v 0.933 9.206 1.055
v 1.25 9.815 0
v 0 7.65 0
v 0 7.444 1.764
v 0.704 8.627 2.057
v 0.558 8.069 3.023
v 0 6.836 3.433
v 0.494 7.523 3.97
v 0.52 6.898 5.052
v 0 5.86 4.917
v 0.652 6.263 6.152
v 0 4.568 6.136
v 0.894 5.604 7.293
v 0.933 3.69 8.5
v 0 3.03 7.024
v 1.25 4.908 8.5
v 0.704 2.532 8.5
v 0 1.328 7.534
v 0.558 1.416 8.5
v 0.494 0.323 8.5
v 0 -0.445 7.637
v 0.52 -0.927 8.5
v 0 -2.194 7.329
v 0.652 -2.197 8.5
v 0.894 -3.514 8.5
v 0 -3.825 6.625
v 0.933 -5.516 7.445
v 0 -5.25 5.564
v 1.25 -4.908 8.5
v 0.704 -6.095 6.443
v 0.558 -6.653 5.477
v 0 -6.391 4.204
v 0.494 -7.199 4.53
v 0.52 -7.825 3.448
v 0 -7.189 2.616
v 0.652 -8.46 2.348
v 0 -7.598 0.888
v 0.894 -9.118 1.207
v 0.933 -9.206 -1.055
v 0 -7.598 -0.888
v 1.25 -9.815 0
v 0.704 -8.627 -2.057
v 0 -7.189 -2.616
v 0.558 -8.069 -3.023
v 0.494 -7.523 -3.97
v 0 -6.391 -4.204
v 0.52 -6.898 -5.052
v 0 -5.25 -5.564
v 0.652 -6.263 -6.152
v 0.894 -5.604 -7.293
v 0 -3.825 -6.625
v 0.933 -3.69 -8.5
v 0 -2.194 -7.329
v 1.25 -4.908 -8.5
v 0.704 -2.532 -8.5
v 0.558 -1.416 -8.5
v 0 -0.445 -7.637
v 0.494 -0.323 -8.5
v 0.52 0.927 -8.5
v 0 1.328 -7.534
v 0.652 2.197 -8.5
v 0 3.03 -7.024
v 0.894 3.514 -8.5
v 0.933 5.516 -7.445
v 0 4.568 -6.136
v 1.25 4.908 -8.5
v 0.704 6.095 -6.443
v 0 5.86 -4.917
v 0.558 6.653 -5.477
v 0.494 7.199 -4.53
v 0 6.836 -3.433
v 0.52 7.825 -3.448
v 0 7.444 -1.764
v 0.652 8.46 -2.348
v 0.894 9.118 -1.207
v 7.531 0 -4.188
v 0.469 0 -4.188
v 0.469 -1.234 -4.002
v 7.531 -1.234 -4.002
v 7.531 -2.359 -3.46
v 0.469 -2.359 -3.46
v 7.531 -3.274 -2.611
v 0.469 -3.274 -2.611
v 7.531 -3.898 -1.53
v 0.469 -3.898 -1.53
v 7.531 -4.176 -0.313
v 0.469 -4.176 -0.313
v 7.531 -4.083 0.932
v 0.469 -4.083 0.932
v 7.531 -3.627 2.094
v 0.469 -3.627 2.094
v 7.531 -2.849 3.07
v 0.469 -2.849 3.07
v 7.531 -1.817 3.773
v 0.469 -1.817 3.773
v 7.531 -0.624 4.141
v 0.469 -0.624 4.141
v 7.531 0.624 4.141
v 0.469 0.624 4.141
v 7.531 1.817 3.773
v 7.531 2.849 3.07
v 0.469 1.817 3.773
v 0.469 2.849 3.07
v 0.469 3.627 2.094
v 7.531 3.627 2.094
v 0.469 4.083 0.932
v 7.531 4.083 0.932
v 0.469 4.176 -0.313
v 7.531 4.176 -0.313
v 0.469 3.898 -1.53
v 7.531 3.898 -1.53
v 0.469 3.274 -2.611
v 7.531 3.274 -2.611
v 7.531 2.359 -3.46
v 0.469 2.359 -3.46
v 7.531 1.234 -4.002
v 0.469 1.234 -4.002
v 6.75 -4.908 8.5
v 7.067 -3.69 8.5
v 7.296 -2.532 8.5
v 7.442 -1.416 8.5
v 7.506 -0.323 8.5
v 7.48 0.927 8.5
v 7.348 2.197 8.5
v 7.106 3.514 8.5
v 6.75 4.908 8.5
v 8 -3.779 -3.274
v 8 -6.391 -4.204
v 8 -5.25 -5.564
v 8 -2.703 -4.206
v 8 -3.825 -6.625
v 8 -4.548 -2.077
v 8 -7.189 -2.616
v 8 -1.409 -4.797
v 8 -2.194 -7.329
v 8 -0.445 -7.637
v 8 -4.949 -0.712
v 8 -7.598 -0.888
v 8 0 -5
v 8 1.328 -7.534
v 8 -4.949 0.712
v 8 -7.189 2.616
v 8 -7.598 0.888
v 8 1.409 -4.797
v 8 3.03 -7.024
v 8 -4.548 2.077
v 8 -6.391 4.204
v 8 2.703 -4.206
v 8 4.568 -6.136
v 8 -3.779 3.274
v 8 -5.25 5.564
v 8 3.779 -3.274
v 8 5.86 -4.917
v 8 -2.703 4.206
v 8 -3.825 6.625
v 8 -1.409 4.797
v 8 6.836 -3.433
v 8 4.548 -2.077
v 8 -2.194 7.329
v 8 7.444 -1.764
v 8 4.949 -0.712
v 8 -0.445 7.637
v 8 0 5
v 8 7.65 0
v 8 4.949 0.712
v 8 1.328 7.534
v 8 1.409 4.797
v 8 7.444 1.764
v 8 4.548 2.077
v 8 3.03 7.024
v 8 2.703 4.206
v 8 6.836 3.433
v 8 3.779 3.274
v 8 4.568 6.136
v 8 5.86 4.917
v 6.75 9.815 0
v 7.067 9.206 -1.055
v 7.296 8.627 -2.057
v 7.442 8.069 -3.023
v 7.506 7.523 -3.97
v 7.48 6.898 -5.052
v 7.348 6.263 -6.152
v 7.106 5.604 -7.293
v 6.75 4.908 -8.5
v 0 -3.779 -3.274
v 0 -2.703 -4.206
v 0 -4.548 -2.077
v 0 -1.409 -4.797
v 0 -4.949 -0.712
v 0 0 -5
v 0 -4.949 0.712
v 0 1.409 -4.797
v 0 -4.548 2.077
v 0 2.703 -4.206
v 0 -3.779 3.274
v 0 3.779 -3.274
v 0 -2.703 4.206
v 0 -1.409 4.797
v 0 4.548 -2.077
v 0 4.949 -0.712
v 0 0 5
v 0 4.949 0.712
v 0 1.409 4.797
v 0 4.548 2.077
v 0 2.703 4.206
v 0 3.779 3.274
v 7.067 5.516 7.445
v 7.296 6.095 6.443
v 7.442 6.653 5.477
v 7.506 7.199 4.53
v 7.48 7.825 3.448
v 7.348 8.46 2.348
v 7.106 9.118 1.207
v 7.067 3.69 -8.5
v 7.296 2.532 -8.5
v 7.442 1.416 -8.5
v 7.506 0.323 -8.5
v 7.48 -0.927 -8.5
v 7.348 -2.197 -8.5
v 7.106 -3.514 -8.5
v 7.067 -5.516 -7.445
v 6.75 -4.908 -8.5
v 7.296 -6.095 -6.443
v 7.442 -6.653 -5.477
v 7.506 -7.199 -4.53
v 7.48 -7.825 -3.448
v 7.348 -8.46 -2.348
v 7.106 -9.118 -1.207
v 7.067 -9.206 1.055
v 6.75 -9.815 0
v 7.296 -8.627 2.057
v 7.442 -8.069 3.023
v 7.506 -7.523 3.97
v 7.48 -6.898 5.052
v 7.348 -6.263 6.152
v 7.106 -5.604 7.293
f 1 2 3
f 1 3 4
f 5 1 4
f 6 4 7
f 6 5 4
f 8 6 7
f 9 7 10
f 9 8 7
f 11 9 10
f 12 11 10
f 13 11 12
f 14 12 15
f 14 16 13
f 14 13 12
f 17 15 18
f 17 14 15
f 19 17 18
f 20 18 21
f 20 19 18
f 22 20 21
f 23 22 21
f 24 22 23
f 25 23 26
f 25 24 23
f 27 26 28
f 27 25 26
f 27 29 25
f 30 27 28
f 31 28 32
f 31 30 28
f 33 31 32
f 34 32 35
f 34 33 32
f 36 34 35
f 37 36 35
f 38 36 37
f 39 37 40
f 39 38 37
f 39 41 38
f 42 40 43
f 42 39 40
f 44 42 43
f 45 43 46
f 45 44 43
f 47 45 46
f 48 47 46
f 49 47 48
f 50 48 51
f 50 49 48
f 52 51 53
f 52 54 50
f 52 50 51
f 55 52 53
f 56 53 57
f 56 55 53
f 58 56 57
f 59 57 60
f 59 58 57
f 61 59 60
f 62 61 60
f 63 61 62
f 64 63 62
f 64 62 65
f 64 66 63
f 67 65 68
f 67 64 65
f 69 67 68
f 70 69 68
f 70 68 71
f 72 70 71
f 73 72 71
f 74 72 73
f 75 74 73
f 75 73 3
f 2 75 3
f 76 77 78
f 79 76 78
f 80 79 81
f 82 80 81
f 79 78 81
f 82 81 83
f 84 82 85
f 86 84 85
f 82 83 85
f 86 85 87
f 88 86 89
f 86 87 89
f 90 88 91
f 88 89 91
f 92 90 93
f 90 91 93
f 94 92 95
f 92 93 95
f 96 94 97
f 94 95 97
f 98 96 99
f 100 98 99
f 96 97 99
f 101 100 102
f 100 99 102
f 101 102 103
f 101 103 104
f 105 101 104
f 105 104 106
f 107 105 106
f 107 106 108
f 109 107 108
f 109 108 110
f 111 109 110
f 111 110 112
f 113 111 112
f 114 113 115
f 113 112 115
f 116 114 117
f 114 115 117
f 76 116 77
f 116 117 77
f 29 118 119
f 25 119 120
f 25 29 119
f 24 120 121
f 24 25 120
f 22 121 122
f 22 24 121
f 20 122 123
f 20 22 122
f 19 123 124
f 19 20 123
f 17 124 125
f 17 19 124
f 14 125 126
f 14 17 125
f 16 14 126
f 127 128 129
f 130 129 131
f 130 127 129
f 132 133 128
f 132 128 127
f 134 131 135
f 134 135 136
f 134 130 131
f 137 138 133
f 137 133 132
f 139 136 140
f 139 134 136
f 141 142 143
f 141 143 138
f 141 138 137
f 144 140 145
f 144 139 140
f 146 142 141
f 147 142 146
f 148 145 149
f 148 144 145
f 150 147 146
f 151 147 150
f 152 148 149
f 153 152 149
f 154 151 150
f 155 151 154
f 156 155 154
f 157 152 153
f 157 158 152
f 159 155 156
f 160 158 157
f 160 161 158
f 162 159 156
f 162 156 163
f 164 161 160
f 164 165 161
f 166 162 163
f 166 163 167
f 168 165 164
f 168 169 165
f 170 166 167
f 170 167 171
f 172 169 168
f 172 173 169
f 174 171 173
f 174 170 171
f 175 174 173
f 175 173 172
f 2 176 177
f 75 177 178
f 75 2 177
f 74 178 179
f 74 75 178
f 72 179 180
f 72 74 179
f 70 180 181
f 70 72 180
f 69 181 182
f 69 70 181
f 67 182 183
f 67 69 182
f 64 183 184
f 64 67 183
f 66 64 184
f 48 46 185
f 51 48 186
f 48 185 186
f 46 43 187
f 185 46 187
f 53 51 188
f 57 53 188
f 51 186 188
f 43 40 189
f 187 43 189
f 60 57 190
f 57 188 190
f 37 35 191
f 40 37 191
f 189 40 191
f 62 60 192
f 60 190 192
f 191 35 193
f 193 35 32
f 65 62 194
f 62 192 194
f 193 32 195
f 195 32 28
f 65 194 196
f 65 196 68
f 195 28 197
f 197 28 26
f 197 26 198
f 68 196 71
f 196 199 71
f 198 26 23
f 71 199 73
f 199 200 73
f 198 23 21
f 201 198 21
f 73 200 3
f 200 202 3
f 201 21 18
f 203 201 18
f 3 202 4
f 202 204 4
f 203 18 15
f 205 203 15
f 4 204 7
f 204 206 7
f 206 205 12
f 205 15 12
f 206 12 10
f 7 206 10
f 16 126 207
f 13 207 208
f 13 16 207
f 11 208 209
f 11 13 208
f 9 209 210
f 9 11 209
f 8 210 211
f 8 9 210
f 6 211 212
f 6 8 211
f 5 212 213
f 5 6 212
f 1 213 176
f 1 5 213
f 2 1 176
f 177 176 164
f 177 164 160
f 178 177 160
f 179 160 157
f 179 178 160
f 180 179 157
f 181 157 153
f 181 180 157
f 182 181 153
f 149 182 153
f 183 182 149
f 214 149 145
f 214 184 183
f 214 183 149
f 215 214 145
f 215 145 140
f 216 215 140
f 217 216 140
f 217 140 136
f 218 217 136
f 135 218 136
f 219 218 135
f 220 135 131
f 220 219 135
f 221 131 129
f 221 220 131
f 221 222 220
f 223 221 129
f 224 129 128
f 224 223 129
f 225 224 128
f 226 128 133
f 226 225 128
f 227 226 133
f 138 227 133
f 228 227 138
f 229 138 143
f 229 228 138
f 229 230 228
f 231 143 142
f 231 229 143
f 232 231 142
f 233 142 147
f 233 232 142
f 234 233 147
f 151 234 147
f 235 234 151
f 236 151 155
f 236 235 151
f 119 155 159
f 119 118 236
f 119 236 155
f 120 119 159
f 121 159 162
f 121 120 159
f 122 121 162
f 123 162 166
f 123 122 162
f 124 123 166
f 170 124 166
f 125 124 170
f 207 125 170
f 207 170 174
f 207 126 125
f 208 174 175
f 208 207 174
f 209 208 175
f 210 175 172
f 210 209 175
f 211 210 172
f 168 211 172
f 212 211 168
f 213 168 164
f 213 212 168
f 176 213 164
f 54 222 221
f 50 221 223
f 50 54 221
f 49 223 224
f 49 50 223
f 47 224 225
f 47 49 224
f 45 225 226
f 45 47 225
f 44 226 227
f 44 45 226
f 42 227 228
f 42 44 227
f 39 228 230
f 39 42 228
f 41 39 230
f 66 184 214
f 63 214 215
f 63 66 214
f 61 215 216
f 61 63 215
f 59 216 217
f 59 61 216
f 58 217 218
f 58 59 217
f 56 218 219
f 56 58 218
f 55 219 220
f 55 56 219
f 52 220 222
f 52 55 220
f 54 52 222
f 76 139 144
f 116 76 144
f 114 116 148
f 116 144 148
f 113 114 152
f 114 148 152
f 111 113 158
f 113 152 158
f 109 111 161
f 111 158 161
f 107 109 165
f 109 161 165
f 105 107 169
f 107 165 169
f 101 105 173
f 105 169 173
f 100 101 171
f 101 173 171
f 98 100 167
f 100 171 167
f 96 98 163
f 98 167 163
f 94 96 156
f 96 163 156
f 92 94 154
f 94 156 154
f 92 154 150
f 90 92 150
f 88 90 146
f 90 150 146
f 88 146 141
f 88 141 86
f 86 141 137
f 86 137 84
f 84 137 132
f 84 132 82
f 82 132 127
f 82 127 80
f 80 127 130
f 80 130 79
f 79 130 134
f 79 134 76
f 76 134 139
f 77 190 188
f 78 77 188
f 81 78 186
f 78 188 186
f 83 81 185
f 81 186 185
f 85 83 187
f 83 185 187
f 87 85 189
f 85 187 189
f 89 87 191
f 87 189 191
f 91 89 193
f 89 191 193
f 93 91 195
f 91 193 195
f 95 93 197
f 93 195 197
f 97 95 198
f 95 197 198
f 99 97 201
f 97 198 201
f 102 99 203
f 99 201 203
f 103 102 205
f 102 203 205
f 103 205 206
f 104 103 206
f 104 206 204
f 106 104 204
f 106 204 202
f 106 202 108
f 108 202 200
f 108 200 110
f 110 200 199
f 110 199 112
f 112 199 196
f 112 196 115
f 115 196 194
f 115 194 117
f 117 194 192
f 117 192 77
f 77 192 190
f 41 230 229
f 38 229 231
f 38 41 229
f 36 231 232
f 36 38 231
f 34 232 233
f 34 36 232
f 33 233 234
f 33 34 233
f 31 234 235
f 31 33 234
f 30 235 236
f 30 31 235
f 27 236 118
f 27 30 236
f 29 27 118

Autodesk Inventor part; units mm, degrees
ref_plane "YZ Plane" through (0, 0, 0) normal (1, 0, 0) x (0, 1, 0)
ref_plane "XZ Plane" through (0, 0, 0) normal (0, 1, 0) x (-1, 0, 0)
sketch "Эскиз1" plane through (0, 0, 0) normal (1, 0, 0) x (0, 1, 0)
  line L0 (-9.815, 0) -> (-4.9075, 8.5)
  line L1 (-4.9075, 8.5) -> (4.9075, 8.5)
  line L2 (4.9075, 8.5) -> (9.815, 0)
  line L3 (9.815, 0) -> (4.9075, -8.5)
  line L4 (4.9075, -8.5) -> (-4.9075, -8.5)
  line L5 (-4.9075, -8.5) -> (-9.815, 0)
  point P0 (0, 0)
  point P1 (0, 0)
  dimension "d0" = 19.6299
extrude "Базовый элемент" add sketch "Эскиз1" along normal blind 8
sketch "Эскиз2" plane through (0, 0, 0) normal (0, 0, 1) x (1, 0, 0)
  line L0 (0, 4.9075) -> (0, 9.815) projected
  line L1 (0, 9.815) -> (8, 9.815) projected
  line L2 (8, 4.9075) -> (8, 9.815) projected
  line L3 (-1.6, 0) -> (9.6, 0) projected
  line L4 (1.2499, 9.815) -> (0, 7.65)
  line L5 (6.7501, 9.815) -> (8, 7.65)
  dimension "d3" = 30
  dimension "d4" = 30
  dimension "d5" = 15.3
  dimension "d6" = 15.3
revolve "Фаска1" cut sketch "Эскиз2" angle 360 about axis through (-10, 0, 0) along (1, 0, 0)
sketch "Эскиз3" plane through (8, 0, 0) normal (1, 0, 0) x (0, 0, -1)
  arc A0 (-0.625, -1.0825) -> (0.625, -1.0825) centre (0, 0) ccw projected
hole "Резьба" at (8, 0, 0) direction (-1, 0, 0) diameter 8.376 end through all thread size "M10x1.5" class "6H" standard "ISO Metric profile"
chamfer "Фаска2" distance 0.8119 angle 30 1 edges at (8, 0, 4.188) measured on face at (8, 6.4117, -0.7785)
chamfer "Фаска3" distance 0.8119 angle 30 1 edges at (0, 0, 4.188) measured on face at (0, 6.4117, -0.7785)
ref_plane "Work Plane1" through (-19.2723, 0, 0) normal (0, -0.866, -0.5) x (1, 0, 0)
equation "\"d0\" = 1.1547 * SW"
equation "\"d1\" = KOH"
equation "\"d3\" = ANG1"
equation "\"d4\" = ANG2"
equation "\"d5\" = SW0"
equation "\"d6\" = SW01"
equation "\"d8\" = -0.5 * GD1 + 0.5 * NND"
equation "\"d40\" = -0.5 * GD1 + 0.5 * NND"
equation "\"d10\" = -0.5 * GD1 + 0.5 * NND"
equation "\"d41\" = -0.5 * GD1 + 0.5 * NND"
equation "\"ANG1\" = 30deg"
equation "\"ANG2\" = 30deg"
equation "\"KOH\" = 8"
equation "\"SW\" = 17"
equation "\"SW0\" = 15.3"
equation "\"SW01\" = SW0"
equation "\"GUL\" = 0.541266 * PTC"
equation "\"LADI\" = 16.15"
equation "\"TOA\" = 30deg"
equation "\"FAWI\" = 30deg"
equation "\"PTC\" = 1.5"
equation "\"E0\" = 1.155 * SW"
equation "\"GAL\" = 0.541266 * PTC"
equation "\"GD1\" = 8.376202"
equation "\"NND\" = 10"
properties part number "Гайка M10-6H ГОСТ 5915-70(1)" material "Сталь, мягкая"
